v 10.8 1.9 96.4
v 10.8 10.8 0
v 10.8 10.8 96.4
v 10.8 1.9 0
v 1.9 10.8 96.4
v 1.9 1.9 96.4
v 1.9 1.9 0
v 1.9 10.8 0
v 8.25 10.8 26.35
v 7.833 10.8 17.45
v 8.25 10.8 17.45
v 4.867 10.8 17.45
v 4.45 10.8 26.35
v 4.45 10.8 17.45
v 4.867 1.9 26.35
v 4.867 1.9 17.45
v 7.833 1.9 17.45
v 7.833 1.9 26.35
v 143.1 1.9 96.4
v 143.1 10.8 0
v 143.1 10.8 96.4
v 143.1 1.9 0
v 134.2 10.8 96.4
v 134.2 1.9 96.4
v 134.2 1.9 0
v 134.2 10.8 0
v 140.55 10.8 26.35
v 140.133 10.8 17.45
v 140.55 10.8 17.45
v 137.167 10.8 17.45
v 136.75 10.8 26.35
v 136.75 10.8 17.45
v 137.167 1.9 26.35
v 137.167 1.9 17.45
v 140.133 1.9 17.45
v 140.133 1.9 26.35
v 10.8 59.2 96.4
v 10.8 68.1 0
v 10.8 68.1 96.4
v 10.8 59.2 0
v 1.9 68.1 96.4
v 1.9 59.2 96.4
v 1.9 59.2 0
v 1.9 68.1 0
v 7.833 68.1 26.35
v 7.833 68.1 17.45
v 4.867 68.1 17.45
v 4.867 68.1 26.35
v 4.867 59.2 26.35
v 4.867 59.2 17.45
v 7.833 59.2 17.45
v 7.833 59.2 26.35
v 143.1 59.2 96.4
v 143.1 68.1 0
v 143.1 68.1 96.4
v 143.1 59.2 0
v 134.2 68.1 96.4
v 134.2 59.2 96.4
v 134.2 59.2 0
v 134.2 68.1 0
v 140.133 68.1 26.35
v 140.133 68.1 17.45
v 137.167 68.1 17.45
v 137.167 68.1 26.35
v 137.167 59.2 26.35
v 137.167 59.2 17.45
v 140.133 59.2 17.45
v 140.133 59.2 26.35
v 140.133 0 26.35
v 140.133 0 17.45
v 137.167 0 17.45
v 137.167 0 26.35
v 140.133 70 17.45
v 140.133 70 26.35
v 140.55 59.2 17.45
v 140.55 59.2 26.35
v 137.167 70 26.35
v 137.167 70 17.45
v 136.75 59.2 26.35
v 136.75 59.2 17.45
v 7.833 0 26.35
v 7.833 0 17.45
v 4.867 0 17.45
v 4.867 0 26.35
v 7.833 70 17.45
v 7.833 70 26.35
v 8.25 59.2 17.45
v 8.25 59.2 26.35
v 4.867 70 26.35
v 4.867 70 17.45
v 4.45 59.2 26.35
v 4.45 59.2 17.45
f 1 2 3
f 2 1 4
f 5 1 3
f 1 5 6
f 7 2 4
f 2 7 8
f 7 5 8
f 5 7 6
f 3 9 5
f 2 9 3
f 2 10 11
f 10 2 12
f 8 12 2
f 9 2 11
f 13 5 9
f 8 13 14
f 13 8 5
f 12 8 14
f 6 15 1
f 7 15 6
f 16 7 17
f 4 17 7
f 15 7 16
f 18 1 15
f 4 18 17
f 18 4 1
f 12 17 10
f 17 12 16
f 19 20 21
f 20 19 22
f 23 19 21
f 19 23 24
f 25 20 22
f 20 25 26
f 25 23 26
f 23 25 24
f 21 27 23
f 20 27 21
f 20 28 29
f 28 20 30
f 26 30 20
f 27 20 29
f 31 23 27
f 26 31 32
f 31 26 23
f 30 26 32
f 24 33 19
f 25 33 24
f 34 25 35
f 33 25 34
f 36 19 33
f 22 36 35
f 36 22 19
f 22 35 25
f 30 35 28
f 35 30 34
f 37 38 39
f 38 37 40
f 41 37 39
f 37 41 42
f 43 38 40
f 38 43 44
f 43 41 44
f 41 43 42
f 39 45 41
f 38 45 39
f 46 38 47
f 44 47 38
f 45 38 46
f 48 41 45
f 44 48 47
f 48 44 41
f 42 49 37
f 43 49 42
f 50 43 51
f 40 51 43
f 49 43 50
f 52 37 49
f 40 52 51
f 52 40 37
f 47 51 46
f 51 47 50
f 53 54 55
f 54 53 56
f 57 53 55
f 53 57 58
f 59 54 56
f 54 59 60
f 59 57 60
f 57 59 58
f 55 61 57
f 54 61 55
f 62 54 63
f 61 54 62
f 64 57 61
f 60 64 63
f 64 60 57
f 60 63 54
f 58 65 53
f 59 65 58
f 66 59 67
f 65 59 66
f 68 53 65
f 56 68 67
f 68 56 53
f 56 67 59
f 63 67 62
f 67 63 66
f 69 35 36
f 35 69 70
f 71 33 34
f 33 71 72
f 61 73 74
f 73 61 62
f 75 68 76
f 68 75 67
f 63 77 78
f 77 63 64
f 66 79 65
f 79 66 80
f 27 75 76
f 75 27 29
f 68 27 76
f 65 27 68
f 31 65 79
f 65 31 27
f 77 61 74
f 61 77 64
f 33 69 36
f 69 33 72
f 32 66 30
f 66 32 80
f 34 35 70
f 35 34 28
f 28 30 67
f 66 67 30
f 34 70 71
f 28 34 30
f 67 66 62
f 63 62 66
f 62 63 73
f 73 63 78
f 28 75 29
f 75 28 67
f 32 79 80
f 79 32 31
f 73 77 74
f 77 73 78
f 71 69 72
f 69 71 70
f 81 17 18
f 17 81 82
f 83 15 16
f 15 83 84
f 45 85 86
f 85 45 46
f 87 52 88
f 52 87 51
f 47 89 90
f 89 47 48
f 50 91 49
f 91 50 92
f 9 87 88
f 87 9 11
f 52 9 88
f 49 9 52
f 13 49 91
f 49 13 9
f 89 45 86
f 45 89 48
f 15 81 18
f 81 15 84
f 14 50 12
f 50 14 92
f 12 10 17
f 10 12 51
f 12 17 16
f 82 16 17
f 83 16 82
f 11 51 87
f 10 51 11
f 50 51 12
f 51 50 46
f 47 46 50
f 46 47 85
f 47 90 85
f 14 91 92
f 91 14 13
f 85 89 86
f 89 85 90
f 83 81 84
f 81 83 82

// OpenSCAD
// ALL UNITS IN centimetres.

// Position enum
pos_fl = 0;
pos_fr = 1;
pos_br = 2;
pos_bl = 3;
// other positions:
pos_f  = 4;
pos_b  = 5;
pos_r  = 6;
pos_l  = 7;

pos_ft  = 8;
pos_bt  = 9;
pos_rt  = 10;
pos_lt  = 11;
pos_fb  = 12;
pos_bb  = 13;
pos_rb  = 14;
pos_lb  = 15;

// for differences:
delta = 0.1;

// lumber dimensions
ply_thickness = 1.8;
two_by = 3.8;
four_by = 8.9;
six_by = 14;

// table top dimensions
tt_width = 145; // x
tt_height = 100; // z
tt_depth = 70; // y
// two-layers of ply.
tt_thickness = ply_thickness*2; // in z

// placement variables
stretcher_lift = 13; // from floor to bottom of x-oriented stretchers.
overhang = two_by/2;
bottom_trestle_lift = stretcher_lift + four_by/2;


module leg(position) {
    // This is half an apron thickness.
    thickness=four_by;
    height = tt_height - tt_thickness;
    
    small_offset = overhang;
    x_offset = (position == pos_fl || position == pos_bl) ? small_offset : tt_width - small_offset - thickness;
    y_offset = (position == pos_fr || position == pos_fl) ? small_offset : tt_depth - small_offset - thickness;
    
    echo ("CUT LIST: Leg. 4x4 stock (assumed 89mm^2)", length=height);
    translate([x_offset, y_offset, 0]) {
        color("#4E220F")
        difference() {
            cube([thickness, thickness, height], center = false);
            union() { // cuts to make for mortices.
                translate([four_by/3,-delta,bottom_trestle_lift]) {
                    cube([four_by/3, four_by+(2*delta), four_by], center=false);
                }
            }
        }
    }
    
}

module top() {
    echo("CUT LIST: Top. Two layers of 18mm ply,", width=tt_width, length=tt_depth);
    %translate([0, 0, tt_height-tt_thickness]) {
        color("#F7F1DE")
        cube([tt_width, tt_depth, tt_thickness], center = false);
    }
}

module bottom_trestle(x_offset) {
    // Bottom tresles have a through-mortice cut into the face of the tenon, which is the same size as the mortice (2.966), starting at the midpoint and going down.
    // Bottom tresles also have a dado/groove from midpoint to 1.8 above, depth matches the tenon cheek.
    // the tenon also sticks out 2_by/2.
    y_offset = 0; // the end of the tenon is flush with the benchtop
    y_length = tt_depth;
    
    lumber_height = four_by;
    lumber_thickness = two_by;
    tenon_cheek_depth = (two_by-(four_by/3))/2;
    
    echo("CUT LIST: bottom trestle, 2x4 stock (assumed 89/38mm)", length = y_length)
    translate([x_offset, y_offset, bottom_trestle_lift]) {
        color("#9D6638")
        difference() {
            union() {
                cube([two_by, y_length, four_by], center = false);

            }
            union() { // cuts out of board
                // four tenon cheeks
                translate([(two_by+(four_by/3))/2,-delta,-delta]) {
                    cube([tenon_cheek_depth+delta,overhang+four_by+delta,four_by+(2*delta)], center=false);
                };
                translate([-delta,-delta,-delta]) {
                    cube([tenon_cheek_depth+delta,overhang+four_by+delta,four_by+(2*delta)], center=false);
                };
                translate([(two_by+(four_by/3))/2,y_length-(overhang+four_by),-delta]) {
                    cube([tenon_cheek_depth+delta,overhang+four_by+delta,four_by+(2*delta)], center=false);
                };
                translate([-delta,y_length-(overhang+four_by),-delta]) {
                    cube([tenon_cheek_depth+delta,overhang+four_by+delta,four_by+(2*delta)], center=false);
                };
            }
        }
    }
}

module top_trestle(x_offset) {
    
    
    
}

module trestle(position) {
    // all trestles are y axis oriented.
    // A trestle is a 2x4 between two legs, that has a 2.966 thickness tenon sticking out the end (this is 1/3 of 4x.)
    // Top and Bottom tresles have slightly different cuts into this tenon.
    
    // overhang + half-thickness of leg - half-thickness of trestle. Since overhang = half-thickness of trestle...
    offset_from_x_boundary = four_by/2;

    if (position == pos_rt) {
        top_trestle(tt_width - offset_from_x_boundary - two_by);
    } else if (position == pos_lt) {
        top_trestle(offset_from_x_boundary);
    } else if (position == pos_rb) {
        bottom_trestle(tt_width - offset_from_x_boundary - two_by);
    } else if (position == pos_lb) {
        bottom_trestle(offset_from_x_boundary);
    }
}


echo("ALL CUT LIST measurements are in cm.")
leg(position = pos_fl);
leg(position = pos_fr);
leg(position = pos_bl);
leg(position = pos_br);

top();

//trestle(pos_rt);
//trestle(pos_lt);
trestle(pos_rb);
trestle(pos_lb);
